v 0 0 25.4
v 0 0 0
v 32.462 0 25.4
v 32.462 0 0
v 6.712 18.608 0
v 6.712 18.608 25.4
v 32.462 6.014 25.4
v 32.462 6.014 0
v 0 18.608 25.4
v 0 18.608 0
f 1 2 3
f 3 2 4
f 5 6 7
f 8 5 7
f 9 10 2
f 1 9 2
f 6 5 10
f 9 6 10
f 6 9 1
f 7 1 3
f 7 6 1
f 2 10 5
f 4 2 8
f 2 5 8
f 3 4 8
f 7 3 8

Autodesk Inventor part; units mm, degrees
ref_plane "YZ Plane" through (0, 0, 0) normal (1, 0, 0) x (0, 1, 0)
ref_plane "XZ Plane" through (0, 0, 0) normal (0, 1, 0) x (-1, 0, 0)
ref_plane "XY Plane" through (0, 0, 0) normal (0, 0, 1) x (1, 0, 0)
sketch "Sketch1" plane through (0, 0, 0) normal (0, 0, 1) x (1, 0, 0)
  line L0 (0, 0) -> (32.4623, 0)
  line L1 (32.4623, 0) -> (32.4623, 18.6079)
  line L2 (32.4623, 18.6079) -> (0, 18.6079)
  line L3 (0, 18.6079) -> (0, 0)
extrude "Extrusion1" add sketch "Sketch1" along normal blind 25.4
sketch "Sketch2" plane through (0, 0, 25.4) normal (0, 0, 1) x (1, 0, 0)
  line L0 (32.4623, 0) -> (32.4623, 18.6079) projected
  line L1 (32.4623, 18.6079) -> (0, 18.6079) projected
  line L2 (6.7125, 18.6079) -> (32.4623, 6.0135)
extrude "Extrusion2" cut sketch "Sketch2" against normal through all
properties part number "Work Planes"
